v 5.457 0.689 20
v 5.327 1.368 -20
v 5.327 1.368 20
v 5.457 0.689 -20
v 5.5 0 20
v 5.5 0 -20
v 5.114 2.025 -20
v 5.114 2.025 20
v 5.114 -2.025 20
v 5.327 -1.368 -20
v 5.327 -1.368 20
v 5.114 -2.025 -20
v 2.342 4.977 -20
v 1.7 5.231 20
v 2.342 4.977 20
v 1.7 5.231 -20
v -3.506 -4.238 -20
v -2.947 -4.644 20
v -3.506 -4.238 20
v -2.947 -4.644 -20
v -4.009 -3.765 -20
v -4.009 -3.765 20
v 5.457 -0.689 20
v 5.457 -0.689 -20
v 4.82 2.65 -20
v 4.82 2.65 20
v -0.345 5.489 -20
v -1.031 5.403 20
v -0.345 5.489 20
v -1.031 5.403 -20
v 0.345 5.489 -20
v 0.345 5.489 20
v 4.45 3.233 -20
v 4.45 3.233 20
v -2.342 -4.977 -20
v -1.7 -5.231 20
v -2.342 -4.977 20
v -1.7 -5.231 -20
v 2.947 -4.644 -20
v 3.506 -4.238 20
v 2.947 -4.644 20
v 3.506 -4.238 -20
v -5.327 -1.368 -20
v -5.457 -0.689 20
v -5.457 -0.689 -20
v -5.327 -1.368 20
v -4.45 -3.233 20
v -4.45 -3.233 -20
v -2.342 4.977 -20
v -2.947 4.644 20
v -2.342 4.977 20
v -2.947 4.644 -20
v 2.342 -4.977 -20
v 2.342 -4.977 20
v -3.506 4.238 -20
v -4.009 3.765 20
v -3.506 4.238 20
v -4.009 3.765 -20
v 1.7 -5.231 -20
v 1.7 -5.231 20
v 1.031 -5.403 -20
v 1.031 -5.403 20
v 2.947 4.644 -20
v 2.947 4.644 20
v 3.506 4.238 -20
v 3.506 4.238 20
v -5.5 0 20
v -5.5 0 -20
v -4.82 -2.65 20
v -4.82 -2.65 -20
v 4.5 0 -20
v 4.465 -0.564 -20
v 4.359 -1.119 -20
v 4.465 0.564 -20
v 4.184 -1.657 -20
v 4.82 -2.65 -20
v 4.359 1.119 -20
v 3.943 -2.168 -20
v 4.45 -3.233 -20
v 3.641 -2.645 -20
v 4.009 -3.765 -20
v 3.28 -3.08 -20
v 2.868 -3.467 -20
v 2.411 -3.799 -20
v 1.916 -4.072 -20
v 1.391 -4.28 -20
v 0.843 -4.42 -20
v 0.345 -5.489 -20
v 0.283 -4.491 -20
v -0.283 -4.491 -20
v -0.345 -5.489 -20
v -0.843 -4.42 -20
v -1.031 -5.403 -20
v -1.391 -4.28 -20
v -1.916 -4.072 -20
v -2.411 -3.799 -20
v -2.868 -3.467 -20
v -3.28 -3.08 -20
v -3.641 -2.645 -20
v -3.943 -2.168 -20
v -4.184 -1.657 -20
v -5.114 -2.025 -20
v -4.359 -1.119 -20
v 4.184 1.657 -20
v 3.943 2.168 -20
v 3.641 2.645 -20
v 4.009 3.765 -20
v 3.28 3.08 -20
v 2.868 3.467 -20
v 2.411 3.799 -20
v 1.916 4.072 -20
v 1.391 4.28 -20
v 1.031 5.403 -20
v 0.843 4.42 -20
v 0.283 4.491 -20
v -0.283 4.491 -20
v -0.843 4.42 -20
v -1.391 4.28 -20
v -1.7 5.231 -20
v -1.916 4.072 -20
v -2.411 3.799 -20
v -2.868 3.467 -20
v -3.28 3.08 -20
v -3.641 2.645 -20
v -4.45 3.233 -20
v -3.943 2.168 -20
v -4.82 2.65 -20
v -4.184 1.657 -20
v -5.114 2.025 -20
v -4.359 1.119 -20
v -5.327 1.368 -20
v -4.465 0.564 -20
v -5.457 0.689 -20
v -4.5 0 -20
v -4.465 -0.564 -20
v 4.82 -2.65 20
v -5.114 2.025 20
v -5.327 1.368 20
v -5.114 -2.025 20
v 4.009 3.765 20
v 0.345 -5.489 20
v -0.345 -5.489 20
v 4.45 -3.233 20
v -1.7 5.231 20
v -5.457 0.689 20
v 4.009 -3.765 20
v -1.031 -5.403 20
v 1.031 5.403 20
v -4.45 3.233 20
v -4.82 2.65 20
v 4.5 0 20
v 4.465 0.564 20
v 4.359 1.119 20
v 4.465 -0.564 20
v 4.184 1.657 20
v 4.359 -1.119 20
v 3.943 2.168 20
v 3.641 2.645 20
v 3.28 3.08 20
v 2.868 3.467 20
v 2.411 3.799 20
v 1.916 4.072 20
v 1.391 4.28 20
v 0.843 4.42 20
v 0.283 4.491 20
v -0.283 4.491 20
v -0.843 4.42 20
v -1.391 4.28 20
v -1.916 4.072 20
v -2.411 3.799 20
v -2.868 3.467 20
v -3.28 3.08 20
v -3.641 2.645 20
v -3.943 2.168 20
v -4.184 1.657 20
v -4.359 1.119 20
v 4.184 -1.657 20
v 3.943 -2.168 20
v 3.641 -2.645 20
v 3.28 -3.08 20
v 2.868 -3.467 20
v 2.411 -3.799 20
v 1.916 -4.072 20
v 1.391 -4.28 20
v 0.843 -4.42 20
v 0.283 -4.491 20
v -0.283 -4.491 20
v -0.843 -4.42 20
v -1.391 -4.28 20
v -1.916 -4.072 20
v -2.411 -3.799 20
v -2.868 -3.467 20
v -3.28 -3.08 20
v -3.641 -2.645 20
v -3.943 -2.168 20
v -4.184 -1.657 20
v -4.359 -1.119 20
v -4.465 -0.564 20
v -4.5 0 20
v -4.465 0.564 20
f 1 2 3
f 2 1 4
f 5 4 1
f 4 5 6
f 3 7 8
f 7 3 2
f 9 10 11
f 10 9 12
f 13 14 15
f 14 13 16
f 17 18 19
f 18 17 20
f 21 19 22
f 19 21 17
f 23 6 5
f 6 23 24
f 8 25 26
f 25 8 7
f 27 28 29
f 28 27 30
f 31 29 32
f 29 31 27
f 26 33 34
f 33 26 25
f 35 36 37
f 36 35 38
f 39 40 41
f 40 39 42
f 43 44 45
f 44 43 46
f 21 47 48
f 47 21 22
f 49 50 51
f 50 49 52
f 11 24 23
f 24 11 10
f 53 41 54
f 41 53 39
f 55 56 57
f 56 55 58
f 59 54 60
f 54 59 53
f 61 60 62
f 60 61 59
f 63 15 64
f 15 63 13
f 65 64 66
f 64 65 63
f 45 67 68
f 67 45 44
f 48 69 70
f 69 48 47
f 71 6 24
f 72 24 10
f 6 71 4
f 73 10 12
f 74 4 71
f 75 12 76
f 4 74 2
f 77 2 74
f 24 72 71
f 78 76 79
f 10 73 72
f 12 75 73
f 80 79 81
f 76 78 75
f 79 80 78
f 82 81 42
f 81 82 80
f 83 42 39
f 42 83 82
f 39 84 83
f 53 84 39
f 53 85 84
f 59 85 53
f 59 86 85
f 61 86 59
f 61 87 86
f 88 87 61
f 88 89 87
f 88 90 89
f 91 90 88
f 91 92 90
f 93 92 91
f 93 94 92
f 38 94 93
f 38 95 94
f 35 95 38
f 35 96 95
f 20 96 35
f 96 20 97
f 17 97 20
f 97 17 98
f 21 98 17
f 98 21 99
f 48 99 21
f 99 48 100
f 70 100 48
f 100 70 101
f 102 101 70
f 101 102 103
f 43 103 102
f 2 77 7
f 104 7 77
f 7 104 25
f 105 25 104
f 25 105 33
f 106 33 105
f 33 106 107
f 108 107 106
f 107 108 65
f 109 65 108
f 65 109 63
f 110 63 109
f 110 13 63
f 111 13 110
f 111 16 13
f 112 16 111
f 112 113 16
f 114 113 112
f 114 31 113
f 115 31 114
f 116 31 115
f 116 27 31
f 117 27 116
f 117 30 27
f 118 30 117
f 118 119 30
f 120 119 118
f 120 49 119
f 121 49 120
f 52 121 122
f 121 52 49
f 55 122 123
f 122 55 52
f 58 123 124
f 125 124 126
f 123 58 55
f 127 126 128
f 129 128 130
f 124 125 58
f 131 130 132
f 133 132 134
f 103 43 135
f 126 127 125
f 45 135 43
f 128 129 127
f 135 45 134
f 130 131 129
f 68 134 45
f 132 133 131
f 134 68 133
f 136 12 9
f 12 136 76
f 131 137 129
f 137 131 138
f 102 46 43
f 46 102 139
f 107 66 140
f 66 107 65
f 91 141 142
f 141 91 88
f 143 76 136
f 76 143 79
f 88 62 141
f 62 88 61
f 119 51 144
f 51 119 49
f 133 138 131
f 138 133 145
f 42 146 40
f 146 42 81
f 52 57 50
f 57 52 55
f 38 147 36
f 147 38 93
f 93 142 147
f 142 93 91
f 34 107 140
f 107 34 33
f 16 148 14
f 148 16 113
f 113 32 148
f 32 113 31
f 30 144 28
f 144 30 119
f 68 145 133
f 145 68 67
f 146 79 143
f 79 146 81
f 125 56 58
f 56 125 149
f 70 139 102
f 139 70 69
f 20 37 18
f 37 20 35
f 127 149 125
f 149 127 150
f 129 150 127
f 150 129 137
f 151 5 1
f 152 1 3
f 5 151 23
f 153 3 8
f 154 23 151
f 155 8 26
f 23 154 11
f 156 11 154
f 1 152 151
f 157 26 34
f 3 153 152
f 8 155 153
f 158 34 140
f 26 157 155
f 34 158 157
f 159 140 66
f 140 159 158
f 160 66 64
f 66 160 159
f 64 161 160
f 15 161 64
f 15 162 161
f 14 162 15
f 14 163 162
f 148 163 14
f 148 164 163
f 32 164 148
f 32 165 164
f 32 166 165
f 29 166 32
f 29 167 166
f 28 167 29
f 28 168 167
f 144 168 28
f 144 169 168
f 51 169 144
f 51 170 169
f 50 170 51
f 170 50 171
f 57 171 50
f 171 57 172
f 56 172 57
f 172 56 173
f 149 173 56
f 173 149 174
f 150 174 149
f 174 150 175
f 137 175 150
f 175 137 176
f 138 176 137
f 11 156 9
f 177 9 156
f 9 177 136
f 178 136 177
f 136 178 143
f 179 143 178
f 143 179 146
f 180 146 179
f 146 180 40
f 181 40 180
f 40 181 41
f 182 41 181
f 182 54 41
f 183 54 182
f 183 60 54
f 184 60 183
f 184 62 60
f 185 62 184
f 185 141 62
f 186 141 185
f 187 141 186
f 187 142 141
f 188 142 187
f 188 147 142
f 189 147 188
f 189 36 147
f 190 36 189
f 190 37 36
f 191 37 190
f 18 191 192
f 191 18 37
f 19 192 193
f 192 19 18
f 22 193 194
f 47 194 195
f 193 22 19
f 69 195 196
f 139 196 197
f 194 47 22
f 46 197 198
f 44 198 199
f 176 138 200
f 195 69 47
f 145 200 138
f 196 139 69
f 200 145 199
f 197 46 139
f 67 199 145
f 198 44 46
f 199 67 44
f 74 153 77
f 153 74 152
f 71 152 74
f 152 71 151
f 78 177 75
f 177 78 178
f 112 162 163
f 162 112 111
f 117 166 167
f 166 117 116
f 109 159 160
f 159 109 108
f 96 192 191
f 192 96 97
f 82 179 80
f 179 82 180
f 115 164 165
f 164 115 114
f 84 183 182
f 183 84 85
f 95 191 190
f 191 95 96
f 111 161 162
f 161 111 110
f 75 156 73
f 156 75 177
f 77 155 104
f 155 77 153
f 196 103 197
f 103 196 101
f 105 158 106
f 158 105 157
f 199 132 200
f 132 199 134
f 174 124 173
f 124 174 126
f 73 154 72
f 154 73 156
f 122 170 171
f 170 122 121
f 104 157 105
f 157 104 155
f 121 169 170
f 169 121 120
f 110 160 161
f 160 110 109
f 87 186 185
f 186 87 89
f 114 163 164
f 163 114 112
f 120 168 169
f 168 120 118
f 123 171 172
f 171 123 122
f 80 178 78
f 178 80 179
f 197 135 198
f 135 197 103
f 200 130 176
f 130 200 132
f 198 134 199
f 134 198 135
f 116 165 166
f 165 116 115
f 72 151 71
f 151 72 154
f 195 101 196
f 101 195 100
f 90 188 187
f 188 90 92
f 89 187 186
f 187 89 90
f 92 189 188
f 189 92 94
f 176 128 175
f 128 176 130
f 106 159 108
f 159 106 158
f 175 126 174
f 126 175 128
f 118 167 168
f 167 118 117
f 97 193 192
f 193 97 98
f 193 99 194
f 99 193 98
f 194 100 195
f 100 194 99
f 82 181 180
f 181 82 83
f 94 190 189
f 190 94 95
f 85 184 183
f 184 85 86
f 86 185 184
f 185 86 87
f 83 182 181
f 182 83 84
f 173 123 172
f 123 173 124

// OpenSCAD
$fn = 50;


difference() {
	union() {
		translate(v = [0, 0, -20.0000000000]) {
			cylinder(h = 40, r = 5.5000000000);
		}
	}
	union() {
		translate(v = [0, 0, -100.0000000000]) {
			cylinder(h = 200, r = 4.5000000000);
		}
	}
}
